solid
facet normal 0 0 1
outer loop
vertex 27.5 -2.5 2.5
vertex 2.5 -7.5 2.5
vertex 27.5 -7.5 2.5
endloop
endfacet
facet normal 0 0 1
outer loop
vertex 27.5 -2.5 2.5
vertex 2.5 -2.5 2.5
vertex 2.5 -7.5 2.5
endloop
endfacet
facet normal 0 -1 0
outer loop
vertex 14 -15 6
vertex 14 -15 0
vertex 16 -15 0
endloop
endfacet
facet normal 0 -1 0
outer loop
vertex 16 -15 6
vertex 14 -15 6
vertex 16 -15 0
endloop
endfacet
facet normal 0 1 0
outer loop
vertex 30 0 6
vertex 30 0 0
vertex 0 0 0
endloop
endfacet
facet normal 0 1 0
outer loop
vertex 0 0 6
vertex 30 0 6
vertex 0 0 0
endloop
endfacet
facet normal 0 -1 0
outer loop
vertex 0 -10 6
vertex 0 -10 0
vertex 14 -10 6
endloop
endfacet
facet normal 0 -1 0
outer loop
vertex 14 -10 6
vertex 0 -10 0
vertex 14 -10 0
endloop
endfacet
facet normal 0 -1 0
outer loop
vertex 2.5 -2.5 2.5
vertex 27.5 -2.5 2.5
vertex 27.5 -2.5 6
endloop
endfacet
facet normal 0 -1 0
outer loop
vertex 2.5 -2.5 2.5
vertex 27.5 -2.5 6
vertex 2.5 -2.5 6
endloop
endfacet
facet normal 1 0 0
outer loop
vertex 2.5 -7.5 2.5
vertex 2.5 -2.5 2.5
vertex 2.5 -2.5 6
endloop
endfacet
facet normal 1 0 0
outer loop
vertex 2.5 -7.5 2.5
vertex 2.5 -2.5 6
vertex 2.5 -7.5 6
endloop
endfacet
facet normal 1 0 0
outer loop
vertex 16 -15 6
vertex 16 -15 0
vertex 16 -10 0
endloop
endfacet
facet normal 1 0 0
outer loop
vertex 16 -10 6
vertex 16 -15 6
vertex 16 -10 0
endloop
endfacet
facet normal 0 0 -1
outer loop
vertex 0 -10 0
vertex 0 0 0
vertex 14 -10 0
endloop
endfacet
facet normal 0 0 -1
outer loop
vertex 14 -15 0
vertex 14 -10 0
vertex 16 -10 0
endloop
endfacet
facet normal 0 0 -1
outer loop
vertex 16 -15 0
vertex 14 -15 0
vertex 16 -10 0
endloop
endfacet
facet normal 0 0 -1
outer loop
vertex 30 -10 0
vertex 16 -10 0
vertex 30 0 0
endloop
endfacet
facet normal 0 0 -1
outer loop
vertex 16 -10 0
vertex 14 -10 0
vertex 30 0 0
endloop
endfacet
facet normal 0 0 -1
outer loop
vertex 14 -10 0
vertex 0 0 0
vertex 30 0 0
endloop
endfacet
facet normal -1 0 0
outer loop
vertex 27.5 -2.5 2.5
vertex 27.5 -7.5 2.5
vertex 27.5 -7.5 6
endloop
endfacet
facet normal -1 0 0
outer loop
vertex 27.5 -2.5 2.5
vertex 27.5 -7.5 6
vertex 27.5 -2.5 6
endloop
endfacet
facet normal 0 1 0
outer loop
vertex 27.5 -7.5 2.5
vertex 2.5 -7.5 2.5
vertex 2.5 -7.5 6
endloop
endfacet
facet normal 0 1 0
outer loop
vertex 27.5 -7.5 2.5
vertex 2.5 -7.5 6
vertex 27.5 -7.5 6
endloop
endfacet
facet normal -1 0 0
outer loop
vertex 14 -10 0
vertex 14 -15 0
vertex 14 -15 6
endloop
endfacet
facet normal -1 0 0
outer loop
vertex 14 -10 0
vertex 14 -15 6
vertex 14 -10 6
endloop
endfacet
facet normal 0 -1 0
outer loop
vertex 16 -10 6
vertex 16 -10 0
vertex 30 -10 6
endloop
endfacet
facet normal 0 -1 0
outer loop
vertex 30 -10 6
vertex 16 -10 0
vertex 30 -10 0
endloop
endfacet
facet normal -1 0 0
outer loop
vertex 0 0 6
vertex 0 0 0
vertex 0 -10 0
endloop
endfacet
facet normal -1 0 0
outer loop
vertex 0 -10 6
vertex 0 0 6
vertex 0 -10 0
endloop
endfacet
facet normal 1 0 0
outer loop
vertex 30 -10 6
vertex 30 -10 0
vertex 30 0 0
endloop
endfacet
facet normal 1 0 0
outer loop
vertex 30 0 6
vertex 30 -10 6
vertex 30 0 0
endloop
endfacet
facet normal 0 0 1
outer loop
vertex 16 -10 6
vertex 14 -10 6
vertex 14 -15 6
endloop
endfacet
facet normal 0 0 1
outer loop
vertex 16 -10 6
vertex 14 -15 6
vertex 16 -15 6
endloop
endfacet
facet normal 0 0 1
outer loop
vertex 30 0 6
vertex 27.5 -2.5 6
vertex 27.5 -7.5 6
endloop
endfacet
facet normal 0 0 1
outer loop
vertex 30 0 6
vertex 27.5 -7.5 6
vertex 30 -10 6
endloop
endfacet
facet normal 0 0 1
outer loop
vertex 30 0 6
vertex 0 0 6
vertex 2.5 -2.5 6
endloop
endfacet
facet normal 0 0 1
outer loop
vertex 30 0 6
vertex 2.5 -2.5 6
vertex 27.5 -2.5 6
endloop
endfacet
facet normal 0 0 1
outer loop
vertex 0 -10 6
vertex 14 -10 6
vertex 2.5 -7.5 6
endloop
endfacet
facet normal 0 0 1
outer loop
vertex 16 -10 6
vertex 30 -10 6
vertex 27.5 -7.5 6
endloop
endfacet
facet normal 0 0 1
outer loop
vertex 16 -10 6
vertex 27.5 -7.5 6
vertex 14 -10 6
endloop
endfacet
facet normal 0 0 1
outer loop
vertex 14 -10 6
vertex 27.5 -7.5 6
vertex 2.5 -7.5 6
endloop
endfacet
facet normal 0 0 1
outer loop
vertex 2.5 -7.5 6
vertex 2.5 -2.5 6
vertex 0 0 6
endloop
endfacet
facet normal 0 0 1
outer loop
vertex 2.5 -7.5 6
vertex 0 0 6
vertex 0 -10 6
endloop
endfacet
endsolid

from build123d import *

# Parameters (mm, degrees)
F0_W        = 2
F0_H        = 5
F1_DEPTH    = 6
F2_T        = 2.5
F2_T3_DEPTH = 11


# Not quite as in the source:
# - a shell that OpenCascade refuses in one call is made with other operations: the cavity is built on its own and cut out


with BuildPart() as f1:
    # F0 (on Top) → F1 (new body)
    with BuildSketch(Plane.XY):
        Polygon((30, 0), (0, 0), (0, -10), (14, -10), (14, -5), (16, -5), (16, -10), (30, -10), align=None)
        with Locations((15, -7.5)):
            Rectangle(F0_W, F0_H)
        with Locations((15, -12.5)):
            Rectangle(F0_W, F0_H)
    extrude(amount=F1_DEPTH)

    # F2: shell of thickness 2.5, made by hand


with BuildPart() as f2_core1:
    # F2_t2: copy of F1
    add(f1.part)

    # the walls: a layer under each face that stays
    f2_faces = [f2_core1.faces().sort_by_distance(p)[0] for p in [
        (15, 0, 3),
        (0, -5, 3),
        (7, -10, 3),
        (14, -12.5, 3),
        (15, -15, 3),
        (16, -12.5, 3),
        (23, -10, 3),
        (30, -5, 3),
        (15, -7.5, 0),
    ]]
    thicken(f2_faces, amount=-F2_T, mode=Mode.SUBTRACT)

    # F2_s4 → F2_t3 (cut)
    with BuildSketch(Plane.XY.offset(-2.5)):
        Polygon((13.975, -10.025), (14, -7.5), (16.5, -7.5), (16.5, -10), align=None)
        Polygon((16.025, -10.025), (13.5, -10), (13.5, -7.5), (16, -7.5), align=None)
    extrude(amount=F2_T3_DEPTH, mode=Mode.SUBTRACT)


with BuildPart() as f1_1:
    add(f1.part)

    # what is left inside the walls is the cavity
    f2_cavity = [f2_core1.part.solids().sort_by_distance(p)[0] for p in [
        (15, -5.833333, 5.975),
    ]]
    add(f2_cavity, mode=Mode.SUBTRACT)


solid = f1_1.part
